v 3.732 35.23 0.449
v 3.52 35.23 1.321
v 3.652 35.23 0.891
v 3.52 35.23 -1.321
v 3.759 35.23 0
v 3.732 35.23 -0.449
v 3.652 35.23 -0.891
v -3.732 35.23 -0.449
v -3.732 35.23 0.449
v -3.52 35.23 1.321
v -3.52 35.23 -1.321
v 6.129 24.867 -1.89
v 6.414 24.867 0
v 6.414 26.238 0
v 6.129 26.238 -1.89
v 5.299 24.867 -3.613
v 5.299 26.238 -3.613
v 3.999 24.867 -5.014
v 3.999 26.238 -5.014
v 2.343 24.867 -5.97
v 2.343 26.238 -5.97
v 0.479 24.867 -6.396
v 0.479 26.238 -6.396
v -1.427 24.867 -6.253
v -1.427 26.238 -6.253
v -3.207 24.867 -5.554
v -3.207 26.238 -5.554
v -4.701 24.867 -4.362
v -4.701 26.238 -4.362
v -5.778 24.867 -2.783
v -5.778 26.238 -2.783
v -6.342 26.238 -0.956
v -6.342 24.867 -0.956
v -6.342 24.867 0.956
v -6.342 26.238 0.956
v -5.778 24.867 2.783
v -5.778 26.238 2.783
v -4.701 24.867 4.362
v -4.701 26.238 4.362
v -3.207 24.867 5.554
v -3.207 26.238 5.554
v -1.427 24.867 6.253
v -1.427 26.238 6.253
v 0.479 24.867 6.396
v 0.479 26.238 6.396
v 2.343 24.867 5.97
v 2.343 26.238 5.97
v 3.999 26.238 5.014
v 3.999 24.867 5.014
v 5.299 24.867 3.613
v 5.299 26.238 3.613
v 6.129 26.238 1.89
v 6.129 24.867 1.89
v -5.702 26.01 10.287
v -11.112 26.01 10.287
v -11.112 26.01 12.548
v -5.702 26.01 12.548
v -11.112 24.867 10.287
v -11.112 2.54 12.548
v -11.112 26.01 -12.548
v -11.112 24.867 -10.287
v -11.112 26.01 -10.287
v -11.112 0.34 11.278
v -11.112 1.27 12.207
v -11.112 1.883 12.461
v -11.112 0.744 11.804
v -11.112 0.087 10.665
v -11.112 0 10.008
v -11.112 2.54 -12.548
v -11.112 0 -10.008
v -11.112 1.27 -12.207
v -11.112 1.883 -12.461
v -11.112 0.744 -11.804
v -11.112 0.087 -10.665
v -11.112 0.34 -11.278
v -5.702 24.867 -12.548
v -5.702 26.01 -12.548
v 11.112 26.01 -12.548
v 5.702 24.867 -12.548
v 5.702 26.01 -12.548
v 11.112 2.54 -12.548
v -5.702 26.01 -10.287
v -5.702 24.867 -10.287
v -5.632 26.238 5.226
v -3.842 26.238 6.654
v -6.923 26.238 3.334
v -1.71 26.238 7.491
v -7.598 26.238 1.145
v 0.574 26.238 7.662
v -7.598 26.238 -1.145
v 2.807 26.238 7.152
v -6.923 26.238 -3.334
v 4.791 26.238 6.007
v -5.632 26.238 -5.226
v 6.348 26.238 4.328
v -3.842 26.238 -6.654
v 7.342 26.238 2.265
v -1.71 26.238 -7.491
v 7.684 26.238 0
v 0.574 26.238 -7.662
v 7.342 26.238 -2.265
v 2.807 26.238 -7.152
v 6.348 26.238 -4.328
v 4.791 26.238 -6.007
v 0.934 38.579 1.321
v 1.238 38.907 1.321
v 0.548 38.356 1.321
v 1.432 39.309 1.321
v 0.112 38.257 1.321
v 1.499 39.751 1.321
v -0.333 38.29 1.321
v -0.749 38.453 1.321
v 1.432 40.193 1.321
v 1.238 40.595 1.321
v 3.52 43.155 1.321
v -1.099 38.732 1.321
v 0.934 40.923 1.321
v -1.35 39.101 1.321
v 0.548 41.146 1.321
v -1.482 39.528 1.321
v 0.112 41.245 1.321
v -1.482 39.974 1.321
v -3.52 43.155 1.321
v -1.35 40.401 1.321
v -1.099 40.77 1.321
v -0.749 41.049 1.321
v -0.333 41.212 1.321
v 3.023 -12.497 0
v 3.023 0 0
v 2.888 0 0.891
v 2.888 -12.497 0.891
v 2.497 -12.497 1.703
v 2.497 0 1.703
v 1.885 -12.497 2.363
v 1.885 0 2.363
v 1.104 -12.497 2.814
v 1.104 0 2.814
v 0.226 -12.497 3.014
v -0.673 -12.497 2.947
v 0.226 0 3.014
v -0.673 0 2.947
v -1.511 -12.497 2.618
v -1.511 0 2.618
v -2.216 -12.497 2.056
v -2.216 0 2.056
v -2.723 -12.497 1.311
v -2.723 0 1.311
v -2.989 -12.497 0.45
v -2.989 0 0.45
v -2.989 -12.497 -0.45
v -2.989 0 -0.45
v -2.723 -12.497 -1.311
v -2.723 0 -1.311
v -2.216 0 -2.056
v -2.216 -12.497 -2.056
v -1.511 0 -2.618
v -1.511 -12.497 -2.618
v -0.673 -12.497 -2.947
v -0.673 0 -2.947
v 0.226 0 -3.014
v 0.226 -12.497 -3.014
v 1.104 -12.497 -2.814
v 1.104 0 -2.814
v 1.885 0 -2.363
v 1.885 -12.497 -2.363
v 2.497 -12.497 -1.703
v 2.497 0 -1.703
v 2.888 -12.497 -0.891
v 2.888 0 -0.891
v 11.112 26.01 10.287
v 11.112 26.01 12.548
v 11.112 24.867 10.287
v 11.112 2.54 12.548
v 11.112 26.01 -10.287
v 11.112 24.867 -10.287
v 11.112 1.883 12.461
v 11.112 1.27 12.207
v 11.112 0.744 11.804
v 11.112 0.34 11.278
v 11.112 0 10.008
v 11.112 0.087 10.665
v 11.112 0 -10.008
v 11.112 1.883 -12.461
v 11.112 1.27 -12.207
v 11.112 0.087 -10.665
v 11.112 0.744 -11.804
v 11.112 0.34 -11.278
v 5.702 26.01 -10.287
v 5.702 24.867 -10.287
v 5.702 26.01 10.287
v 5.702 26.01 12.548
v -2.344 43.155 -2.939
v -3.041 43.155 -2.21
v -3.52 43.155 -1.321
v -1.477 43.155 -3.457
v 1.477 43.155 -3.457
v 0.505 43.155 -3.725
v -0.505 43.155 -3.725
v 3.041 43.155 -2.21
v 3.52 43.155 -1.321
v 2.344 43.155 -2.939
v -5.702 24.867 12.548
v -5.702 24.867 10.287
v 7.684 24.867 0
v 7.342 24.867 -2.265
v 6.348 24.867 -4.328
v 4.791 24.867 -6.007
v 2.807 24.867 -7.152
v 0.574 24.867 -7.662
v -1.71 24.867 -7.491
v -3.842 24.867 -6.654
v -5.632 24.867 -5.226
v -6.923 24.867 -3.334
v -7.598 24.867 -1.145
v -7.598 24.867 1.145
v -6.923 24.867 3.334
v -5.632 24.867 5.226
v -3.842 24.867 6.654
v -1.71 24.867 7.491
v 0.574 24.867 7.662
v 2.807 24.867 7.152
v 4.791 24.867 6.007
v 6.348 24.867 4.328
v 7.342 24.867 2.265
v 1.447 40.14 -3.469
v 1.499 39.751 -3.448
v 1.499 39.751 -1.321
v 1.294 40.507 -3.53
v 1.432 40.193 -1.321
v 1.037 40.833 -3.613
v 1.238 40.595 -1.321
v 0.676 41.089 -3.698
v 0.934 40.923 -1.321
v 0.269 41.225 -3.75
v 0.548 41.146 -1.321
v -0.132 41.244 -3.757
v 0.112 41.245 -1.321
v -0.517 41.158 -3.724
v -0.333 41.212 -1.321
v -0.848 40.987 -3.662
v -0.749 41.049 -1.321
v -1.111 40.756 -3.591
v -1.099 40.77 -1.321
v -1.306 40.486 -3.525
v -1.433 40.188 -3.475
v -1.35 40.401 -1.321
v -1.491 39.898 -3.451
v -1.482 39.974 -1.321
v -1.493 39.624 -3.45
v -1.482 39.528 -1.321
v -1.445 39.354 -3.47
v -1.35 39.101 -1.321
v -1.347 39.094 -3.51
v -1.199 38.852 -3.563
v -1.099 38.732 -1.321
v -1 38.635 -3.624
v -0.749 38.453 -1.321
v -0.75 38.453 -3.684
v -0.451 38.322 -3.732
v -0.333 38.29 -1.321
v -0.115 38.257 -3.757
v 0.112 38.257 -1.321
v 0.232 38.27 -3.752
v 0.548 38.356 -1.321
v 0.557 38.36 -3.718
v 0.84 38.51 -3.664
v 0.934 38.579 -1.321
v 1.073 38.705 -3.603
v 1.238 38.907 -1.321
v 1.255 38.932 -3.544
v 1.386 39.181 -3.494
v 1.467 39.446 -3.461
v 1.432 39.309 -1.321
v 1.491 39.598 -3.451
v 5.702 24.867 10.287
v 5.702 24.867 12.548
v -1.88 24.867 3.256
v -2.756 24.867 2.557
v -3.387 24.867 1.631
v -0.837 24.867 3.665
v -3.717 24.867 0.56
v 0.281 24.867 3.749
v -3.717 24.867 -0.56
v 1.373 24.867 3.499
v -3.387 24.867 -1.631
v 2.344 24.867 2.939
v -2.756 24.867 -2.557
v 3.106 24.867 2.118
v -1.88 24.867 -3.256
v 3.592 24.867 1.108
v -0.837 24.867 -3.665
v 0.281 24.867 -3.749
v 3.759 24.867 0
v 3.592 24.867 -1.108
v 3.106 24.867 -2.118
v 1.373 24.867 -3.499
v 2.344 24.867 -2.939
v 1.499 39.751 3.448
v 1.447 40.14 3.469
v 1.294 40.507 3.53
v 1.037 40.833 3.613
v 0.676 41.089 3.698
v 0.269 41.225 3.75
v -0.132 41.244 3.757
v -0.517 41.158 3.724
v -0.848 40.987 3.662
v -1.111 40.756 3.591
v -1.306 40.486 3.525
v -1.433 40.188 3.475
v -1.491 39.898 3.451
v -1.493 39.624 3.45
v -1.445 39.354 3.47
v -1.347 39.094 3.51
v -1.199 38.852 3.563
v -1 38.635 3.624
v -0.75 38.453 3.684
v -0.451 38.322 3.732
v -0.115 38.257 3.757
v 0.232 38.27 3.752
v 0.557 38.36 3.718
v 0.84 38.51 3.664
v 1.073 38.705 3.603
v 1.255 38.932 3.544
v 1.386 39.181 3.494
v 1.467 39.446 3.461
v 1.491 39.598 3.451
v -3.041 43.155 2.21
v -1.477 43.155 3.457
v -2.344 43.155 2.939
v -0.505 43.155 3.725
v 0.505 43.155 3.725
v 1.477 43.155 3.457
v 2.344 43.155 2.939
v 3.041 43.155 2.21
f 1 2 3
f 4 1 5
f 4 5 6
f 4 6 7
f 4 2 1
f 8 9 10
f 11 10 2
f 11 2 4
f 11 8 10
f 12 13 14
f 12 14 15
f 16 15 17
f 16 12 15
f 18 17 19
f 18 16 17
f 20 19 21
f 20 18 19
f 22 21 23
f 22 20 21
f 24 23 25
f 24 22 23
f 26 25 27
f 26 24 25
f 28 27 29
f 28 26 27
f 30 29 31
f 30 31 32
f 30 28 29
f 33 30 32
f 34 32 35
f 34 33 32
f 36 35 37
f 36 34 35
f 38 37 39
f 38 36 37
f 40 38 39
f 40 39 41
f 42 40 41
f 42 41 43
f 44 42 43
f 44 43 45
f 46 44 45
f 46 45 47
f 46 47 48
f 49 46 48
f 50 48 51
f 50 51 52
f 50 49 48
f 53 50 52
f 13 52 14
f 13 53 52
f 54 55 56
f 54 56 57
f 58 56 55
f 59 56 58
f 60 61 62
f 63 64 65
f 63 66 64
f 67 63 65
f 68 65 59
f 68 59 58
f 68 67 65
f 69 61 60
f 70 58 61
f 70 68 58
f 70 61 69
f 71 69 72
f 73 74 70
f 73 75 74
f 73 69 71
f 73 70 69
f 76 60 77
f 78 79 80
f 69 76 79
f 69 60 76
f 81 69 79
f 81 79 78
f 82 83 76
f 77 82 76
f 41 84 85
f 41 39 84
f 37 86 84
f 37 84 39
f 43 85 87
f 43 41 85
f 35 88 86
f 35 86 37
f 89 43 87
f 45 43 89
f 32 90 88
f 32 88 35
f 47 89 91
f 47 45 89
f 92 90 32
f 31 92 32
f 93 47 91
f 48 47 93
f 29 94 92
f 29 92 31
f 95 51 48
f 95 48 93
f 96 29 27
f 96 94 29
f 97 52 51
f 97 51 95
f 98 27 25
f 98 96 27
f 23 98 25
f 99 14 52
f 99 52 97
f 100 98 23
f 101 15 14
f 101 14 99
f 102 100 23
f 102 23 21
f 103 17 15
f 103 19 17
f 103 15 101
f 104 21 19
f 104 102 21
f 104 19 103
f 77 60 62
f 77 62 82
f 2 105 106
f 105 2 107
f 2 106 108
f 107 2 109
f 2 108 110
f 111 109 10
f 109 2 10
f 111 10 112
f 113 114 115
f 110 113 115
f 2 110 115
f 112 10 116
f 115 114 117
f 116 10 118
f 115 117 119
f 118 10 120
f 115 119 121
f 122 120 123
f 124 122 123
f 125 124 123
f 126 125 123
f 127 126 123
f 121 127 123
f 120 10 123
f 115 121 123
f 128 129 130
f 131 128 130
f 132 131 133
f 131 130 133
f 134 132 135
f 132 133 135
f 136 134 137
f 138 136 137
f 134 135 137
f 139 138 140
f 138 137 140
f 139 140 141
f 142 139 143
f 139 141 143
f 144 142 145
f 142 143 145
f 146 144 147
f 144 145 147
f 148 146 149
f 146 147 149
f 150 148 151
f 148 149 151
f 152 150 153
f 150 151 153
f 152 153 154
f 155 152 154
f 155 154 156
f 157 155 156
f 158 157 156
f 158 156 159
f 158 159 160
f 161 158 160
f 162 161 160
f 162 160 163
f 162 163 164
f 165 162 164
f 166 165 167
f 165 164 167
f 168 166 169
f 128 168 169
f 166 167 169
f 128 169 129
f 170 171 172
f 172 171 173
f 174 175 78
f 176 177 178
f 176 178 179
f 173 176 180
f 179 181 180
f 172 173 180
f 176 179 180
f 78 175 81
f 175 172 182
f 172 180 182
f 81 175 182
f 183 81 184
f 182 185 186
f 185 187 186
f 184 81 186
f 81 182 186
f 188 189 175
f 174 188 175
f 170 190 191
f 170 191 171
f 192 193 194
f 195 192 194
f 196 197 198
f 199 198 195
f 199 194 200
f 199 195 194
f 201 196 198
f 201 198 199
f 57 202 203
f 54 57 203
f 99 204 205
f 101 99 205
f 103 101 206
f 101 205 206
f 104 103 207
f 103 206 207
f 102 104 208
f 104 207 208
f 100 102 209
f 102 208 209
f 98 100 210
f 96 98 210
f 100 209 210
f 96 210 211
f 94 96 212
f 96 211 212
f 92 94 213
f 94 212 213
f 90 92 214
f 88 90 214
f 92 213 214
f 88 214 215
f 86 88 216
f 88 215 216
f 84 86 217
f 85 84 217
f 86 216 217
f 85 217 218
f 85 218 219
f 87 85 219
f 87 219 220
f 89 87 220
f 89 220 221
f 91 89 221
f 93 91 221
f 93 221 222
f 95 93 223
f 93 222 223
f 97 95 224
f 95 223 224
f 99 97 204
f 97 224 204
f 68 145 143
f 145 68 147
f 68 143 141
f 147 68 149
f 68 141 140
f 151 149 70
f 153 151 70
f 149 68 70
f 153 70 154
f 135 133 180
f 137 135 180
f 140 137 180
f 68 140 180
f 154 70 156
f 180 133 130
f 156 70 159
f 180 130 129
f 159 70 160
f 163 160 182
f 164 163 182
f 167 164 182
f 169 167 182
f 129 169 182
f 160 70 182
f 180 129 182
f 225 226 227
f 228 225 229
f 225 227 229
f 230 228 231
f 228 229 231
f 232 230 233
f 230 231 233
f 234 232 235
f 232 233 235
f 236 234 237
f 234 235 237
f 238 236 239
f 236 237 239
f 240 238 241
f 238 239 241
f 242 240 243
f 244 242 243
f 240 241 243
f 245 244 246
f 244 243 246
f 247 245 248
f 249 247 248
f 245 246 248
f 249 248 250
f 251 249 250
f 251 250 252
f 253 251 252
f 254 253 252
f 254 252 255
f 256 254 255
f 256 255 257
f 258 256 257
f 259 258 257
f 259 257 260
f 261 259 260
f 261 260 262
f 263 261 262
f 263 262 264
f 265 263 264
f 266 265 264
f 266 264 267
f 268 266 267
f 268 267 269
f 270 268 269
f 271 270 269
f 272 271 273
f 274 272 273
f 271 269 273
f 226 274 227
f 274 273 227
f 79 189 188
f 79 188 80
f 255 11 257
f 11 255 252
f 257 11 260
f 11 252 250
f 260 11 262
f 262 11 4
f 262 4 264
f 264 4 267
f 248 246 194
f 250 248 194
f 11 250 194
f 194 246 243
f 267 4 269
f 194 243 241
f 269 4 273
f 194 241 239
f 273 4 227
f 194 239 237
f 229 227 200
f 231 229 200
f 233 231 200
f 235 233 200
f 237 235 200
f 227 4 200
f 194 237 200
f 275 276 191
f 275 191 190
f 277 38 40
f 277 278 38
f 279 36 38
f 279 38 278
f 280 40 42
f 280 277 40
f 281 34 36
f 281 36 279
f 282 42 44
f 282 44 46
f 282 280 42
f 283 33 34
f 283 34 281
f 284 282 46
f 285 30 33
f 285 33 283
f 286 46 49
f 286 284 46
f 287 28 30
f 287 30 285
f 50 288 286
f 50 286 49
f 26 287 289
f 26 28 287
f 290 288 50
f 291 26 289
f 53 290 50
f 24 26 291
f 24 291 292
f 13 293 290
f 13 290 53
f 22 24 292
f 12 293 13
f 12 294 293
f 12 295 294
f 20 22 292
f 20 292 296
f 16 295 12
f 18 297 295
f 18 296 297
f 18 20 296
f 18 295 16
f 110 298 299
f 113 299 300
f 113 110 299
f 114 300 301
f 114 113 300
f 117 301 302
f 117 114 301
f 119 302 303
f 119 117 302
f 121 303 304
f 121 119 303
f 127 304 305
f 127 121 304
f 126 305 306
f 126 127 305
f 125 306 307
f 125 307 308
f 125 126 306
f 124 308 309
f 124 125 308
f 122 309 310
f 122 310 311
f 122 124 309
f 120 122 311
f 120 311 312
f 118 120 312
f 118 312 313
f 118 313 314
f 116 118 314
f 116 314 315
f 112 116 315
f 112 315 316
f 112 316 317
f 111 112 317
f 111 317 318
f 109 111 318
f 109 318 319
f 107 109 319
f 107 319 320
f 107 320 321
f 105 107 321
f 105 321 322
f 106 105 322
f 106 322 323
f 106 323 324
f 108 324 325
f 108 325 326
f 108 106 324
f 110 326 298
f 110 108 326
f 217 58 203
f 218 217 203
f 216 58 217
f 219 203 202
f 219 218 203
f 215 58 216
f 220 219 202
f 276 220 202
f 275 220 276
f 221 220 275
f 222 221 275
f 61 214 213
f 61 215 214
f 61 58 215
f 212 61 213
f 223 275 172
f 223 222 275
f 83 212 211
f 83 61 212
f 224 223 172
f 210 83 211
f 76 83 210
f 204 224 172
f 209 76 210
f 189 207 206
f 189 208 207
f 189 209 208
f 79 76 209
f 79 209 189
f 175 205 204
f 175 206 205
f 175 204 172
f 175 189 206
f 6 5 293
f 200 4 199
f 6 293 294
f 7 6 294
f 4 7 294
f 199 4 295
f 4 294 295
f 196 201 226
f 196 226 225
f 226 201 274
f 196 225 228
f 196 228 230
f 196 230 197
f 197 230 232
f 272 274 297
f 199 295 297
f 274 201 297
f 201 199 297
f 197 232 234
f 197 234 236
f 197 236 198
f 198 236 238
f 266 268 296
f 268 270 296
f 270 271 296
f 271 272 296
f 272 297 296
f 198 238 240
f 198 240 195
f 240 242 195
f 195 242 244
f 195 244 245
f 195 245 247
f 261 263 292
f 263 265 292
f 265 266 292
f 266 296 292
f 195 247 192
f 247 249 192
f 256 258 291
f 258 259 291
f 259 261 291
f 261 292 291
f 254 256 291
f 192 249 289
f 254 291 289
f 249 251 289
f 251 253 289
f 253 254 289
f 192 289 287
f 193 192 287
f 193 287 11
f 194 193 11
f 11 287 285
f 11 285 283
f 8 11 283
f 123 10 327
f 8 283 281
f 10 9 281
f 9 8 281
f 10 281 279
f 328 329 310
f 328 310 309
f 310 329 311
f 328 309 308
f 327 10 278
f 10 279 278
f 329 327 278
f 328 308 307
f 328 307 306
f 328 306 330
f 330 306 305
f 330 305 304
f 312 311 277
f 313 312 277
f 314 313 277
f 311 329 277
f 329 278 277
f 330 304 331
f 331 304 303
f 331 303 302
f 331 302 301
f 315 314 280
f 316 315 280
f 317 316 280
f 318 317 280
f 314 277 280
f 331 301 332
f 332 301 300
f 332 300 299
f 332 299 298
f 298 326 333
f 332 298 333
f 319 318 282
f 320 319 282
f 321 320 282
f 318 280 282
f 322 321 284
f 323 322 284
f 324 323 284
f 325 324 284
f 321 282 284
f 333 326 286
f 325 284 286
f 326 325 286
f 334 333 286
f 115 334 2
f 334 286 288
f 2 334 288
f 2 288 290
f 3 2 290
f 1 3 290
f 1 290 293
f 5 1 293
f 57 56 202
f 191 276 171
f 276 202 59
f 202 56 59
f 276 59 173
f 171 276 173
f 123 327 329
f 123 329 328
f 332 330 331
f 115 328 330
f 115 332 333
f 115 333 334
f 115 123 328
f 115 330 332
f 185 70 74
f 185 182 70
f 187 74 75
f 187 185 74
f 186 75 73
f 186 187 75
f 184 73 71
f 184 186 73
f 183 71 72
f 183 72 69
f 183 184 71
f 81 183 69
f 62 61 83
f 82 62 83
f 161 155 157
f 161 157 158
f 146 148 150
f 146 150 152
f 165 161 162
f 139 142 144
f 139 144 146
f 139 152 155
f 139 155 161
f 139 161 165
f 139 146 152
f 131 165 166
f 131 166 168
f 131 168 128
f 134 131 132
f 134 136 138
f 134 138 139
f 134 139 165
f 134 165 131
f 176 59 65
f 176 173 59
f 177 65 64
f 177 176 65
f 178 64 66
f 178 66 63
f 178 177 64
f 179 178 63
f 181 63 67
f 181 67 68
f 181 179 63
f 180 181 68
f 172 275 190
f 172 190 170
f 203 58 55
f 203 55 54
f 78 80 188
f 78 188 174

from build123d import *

# Parameters (mm, degrees)
SKETCH1_W                      = 22.225
SKETCH1_H                      = 25.0952
BOSS_EXTRUDE1_DEPTH            = 24.8666
SKETCH2_R                      = 3.0226
BOSS_EXTRUDE2_DEPTH            = 12.496800002
SKETCH3_R                      = 3.7592
BOSS_EXTRUDE3_DEPTH            = 18.288000094
SKETCH4_R                      = 7.6835
SKETCH4_R_2                    = 6.4135
BOSS_EXTRUDE4_DEPTH            = 1.3716
SKETCH5_W                      = 5.4102
SKETCH5_H                      = 2.2606
BOSS_EXTRUDE5_DEPTH            = 1.143
FILLET1_R                      = 2.54
CUT_EXTRUDE1_REACH             = 13.113
SKETCH6_W                      = 2.6416
SKETCH6_H                      = 7.9248
CUT_EXTRUDE1_DIRECTION_2_REACH = 13.112
CUT_EXTRUDE2_REACH             = 14.548
SKETCH7_R                      = 1.4986
CUT_EXTRUDE2_DIRECTION_2_REACH = 14.548


with BuildPart() as part:
    # Sketch1 → Boss-Extrude1 (new body)
    with BuildSketch(Plane(origin=(0, 0, 0), x_dir=(1, 0, 0), z_dir=(0, 1, 0))):
        Rectangle(SKETCH1_W, SKETCH1_H)
    extrude(amount=BOSS_EXTRUDE1_DEPTH)

    # Sketch2 → Boss-Extrude2 (add)
    with BuildSketch(Plane.XZ):
        Circle(SKETCH2_R)
    extrude(amount=BOSS_EXTRUDE2_DEPTH)

    # Sketch3 → Boss-Extrude3 (add)
    with BuildSketch(Plane(origin=(0, 24.8666, 0), x_dir=(1, 0, 0), z_dir=(0, 1, 0))):
        Circle(SKETCH3_R)
    extrude(amount=BOSS_EXTRUDE3_DEPTH)

    # Sketch4 → Boss-Extrude4 (add)
    with BuildSketch(Plane(origin=(0, 24.8666, 0), x_dir=(1, 0, 0), z_dir=(0, 1, 0))):
        Circle(SKETCH4_R)
        Circle(SKETCH4_R_2, mode=Mode.SUBTRACT)
    extrude(amount=BOSS_EXTRUDE4_DEPTH)

    # Sketch5 → Boss-Extrude5 (add)
    with BuildSketch(Plane(origin=(0, 24.8666, 0), x_dir=(1, 0, 0), z_dir=(0, 1, 0))):
        with Locations((-8.4074, -11.4173)):
            Rectangle(SKETCH5_W, SKETCH5_H)
        with Locations((8.4074, -11.4173)):
            Rectangle(SKETCH5_W, SKETCH5_H)
        with Locations((8.4074, 11.4173)):
            Rectangle(SKETCH5_W, SKETCH5_H)
        with Locations((-8.4074, 11.4173)):
            Rectangle(SKETCH5_W, SKETCH5_H)
    extrude(amount=BOSS_EXTRUDE5_DEPTH)

    # Fillet1
    fillet1_edges = [part.edges().sort_by_distance(p)[0] for p in [
        (0, 0, 12.5476),
        (0, 0, -12.5476),
    ]]
    fillet(fillet1_edges, radius=FILLET1_R)

    # Sketch6 → Cut-Extrude1 (cut, up to next)
    with BuildSketch(Plane(origin=(0, 0, 0), x_dir=(0, 0, -1), z_dir=(1, 0, 0)), mode=Mode.PRIVATE) as cut_extrude1_sk1:
        with Locations((0, 39.192200094)):
            Rectangle(SKETCH6_W, SKETCH6_H)
    cut_extrude1_tool1 = extrude(cut_extrude1_sk1.sketch, amount=-CUT_EXTRUDE1_REACH, mode=Mode.PRIVATE) & part.part
    add(cut_extrude1_tool1.solids().sort_by_distance((0, 39.1922, 0))[0], mode=Mode.SUBTRACT)

    # Sketch6 → Cut-Extrude1 direction 2 (cut, up to next)
    with BuildSketch(Plane(origin=(0, 0, 0), x_dir=(0, 0, -1), z_dir=(1, 0, 0)), mode=Mode.PRIVATE) as cut_extrude1_direction_2_sk1:
        with Locations((0, 39.192200094)):
            Rectangle(SKETCH6_W, SKETCH6_H)
    cut_extrude1_direction_2_tool1 = extrude(cut_extrude1_direction_2_sk1.sketch, amount=CUT_EXTRUDE1_DIRECTION_2_REACH, mode=Mode.PRIVATE) & part.part
    add(cut_extrude1_direction_2_tool1.solids().sort_by_distance((0, 39.1922, 0))[0], mode=Mode.SUBTRACT)

    # Sketch7 → Cut-Extrude2 (cut, up to next)
    with BuildSketch(Plane.XY, mode=Mode.PRIVATE) as cut_extrude2_sk1:
        with Locations((0, 39.751000094)):
            Circle(SKETCH7_R)
    cut_extrude2_tool1 = extrude(cut_extrude2_sk1.sketch, amount=-CUT_EXTRUDE2_REACH, mode=Mode.PRIVATE) & part.part
    add(cut_extrude2_tool1.solids().sort_by_distance((0, 39.751, 0))[0], mode=Mode.SUBTRACT)

    # Sketch7 → Cut-Extrude2 direction 2 (cut, up to next)
    with BuildSketch(Plane.XY, mode=Mode.PRIVATE) as cut_extrude2_direction_2_sk1:
        with Locations((0, 39.751000094)):
            Circle(SKETCH7_R)
    cut_extrude2_direction_2_tool1 = extrude(cut_extrude2_direction_2_sk1.sketch, amount=CUT_EXTRUDE2_DIRECTION_2_REACH, mode=Mode.PRIVATE) & part.part
    add(cut_extrude2_direction_2_tool1.solids().sort_by_distance((0, 39.751, 0))[0], mode=Mode.SUBTRACT)


solid = part.part
